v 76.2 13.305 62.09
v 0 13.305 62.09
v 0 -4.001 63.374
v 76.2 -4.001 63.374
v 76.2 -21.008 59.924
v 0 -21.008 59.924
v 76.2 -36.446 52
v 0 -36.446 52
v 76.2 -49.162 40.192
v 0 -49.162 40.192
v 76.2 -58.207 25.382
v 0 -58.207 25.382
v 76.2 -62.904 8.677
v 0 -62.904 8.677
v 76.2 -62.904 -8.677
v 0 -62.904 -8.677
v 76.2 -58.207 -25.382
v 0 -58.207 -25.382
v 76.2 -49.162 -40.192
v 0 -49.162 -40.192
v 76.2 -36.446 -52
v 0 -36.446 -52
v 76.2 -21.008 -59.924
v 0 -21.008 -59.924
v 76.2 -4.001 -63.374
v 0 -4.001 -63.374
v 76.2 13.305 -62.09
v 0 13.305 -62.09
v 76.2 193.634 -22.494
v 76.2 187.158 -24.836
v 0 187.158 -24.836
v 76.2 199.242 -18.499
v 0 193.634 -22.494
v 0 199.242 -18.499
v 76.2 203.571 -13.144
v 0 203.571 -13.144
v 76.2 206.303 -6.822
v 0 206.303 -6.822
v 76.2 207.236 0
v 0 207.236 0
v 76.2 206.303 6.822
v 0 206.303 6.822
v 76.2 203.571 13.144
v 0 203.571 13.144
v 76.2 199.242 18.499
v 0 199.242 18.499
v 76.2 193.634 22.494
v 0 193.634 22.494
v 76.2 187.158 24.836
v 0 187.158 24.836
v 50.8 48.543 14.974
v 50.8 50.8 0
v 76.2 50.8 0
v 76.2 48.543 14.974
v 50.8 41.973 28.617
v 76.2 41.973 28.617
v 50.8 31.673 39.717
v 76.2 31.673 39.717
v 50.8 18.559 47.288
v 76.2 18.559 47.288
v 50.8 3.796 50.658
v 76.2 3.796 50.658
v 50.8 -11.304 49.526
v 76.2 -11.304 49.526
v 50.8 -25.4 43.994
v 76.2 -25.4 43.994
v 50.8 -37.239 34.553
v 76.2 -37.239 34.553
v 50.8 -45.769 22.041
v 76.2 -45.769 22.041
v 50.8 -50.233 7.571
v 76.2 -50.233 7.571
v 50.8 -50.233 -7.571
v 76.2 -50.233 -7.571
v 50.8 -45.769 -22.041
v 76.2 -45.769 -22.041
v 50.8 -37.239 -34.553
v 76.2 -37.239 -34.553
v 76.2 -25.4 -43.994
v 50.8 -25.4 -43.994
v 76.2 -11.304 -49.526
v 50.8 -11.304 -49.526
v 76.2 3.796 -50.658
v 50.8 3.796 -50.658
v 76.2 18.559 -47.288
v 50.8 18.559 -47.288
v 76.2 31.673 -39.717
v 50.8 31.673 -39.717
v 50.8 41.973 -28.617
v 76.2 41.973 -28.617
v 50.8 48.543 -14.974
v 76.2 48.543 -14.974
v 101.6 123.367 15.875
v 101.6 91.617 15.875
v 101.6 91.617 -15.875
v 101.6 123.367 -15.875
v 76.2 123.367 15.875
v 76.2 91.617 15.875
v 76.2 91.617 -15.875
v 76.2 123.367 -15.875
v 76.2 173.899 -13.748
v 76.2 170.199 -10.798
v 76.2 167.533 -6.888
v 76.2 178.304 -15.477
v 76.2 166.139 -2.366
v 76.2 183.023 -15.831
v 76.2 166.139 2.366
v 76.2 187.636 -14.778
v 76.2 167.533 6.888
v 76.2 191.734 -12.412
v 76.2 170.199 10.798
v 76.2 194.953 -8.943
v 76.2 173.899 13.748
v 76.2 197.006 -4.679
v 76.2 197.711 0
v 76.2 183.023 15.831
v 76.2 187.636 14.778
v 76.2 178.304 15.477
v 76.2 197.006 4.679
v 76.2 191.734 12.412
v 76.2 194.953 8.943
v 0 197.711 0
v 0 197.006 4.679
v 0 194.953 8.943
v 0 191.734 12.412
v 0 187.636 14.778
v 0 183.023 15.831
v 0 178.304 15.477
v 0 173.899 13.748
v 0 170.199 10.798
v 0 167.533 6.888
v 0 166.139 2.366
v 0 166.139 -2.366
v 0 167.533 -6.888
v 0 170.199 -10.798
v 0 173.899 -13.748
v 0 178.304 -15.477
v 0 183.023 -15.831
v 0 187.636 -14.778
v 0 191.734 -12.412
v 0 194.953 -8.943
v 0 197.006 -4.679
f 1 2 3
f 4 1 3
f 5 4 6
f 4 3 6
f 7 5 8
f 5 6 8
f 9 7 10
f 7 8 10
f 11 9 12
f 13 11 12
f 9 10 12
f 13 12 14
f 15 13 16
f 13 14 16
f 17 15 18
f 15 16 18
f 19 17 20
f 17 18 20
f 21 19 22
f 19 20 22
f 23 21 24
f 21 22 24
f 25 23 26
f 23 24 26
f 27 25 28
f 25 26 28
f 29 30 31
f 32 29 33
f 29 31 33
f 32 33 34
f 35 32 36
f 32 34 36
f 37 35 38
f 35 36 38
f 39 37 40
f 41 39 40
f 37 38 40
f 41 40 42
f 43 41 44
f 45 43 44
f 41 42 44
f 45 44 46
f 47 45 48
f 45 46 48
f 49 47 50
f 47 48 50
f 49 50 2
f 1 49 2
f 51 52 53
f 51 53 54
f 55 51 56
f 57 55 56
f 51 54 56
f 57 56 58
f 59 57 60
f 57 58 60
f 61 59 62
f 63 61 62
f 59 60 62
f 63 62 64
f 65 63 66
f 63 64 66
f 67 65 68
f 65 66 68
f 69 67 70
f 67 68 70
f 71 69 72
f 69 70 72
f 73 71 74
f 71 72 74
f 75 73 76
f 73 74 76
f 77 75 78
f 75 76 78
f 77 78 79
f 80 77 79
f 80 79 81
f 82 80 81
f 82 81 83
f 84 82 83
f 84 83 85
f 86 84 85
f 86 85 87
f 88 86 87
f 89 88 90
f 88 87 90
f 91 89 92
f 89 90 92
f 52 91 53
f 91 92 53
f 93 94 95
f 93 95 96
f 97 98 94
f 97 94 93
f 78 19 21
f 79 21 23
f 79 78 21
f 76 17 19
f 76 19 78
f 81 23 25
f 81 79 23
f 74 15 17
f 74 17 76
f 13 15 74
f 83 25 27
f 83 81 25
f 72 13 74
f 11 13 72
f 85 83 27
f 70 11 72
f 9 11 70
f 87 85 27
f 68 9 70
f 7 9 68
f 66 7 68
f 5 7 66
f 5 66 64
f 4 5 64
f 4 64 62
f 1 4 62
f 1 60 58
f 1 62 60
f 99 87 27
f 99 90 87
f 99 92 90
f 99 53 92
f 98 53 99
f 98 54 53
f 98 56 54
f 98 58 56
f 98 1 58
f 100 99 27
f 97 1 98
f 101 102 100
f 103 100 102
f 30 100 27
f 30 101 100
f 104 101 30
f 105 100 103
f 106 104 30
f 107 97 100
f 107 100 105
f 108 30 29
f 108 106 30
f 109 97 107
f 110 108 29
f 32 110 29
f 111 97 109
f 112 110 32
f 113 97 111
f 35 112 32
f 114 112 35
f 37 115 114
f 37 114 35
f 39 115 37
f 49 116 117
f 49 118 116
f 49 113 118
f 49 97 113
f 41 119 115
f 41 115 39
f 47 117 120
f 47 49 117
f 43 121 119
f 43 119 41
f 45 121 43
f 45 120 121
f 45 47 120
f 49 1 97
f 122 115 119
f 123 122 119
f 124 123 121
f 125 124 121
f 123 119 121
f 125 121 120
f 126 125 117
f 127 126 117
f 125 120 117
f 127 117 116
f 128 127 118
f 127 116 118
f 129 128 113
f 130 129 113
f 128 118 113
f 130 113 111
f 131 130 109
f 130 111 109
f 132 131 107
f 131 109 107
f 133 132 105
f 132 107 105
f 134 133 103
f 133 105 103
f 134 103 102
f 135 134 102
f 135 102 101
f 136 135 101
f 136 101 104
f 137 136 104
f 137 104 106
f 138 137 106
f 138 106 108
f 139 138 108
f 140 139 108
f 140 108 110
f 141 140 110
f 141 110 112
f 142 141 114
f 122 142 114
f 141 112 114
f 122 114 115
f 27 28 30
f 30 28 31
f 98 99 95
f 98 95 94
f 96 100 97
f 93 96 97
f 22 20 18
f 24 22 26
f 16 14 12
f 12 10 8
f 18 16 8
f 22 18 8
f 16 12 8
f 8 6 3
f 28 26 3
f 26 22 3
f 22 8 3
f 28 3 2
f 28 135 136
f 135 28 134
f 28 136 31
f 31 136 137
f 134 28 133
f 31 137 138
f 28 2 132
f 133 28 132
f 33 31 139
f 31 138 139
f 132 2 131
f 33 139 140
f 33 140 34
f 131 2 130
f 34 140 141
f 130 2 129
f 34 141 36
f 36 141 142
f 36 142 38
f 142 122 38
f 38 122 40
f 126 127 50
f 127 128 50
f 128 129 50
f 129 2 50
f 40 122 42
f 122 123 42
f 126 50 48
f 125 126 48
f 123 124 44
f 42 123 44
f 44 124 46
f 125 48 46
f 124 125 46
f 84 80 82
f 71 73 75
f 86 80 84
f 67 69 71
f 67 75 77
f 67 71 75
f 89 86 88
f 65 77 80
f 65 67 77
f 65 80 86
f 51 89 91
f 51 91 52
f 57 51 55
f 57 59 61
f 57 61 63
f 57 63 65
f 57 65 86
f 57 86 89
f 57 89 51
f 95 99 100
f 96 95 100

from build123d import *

# Parameters (mm, degrees)
F1_DEPTH = 76.2
F2_R     = 50.8
F3_DEPTH = 25.4
F4_W     = 31.75
F4_H     = 31.75
F5_DEPTH = 25.4
F6_R     = 15.875
F7_DEPTH = 76.2


with BuildPart() as f1:
    # F0 (on Right) → F1 (new body)
    with BuildSketch(Plane.YZ):
        with BuildLine():
            ThreePointArc((13.3050971344, -62.0904532939), (49.3817965856, -39.9210241099), (63.5, 0))
            ThreePointArc((63.5, 0), (49.3817965856, 39.9210241099), (13.3050971344, 62.0904532939))
            ThreePointArc((13.3050971344, 62.0904532939), (-63.5, 0), (13.3050971344, -62.0904532939))
        make_face()
        with BuildLine():
            ThreePointArc((13.3050971344, 62.0904532939), (49.3817965856, 39.9210241099), (63.5, 0))
            ThreePointArc((63.5, 0), (49.3817965856, -39.9210241099), (13.3050971344, -62.0904532939))
            Line((13.3050971344, -62.0904532939), (187.1583663574, -24.8361813176))
            ThreePointArc((187.1583663574, -24.8361813176), (156.4363275036, 0), (187.1583663574, 24.8361813176))
            Line((187.1583663574, 24.8361813176), (13.3050971344, 62.0904532939))
        make_face()
        with BuildLine():
            ThreePointArc((207.2363275036, 0), (201.5890461378, 15.968409644), (187.1583663574, 24.8361813176))
            ThreePointArc((187.1583663574, 24.8361813176), (156.4363275036, 0), (187.1583663574, -24.8361813176))
            ThreePointArc((187.1583663574, -24.8361813176), (201.5890461378, -15.968409644), (207.2363275036, 0))
        make_face()
    extrude(amount=F1_DEPTH)

    # F2 (on face) → F3 (cut)
    with BuildSketch(Plane.YZ.offset(76.2)):
        Circle(F2_R)
    extrude(amount=-F3_DEPTH, mode=Mode.SUBTRACT)

    # F4 (on face) → F5 (join)
    with BuildSketch(Plane.YZ.offset(76.2)):
        with Locations((107.4921913939, 0)):
            Rectangle(F4_W, F4_H)
    extrude(amount=F5_DEPTH)

    # F6 (on face) → F7 (cut, through all)
    with BuildSketch(Plane.YZ.offset(76.2)):
        with Locations((181.8363275036, 0)):
            Circle(F6_R)
    extrude(amount=-F7_DEPTH, mode=Mode.SUBTRACT)


solid = f1.part
